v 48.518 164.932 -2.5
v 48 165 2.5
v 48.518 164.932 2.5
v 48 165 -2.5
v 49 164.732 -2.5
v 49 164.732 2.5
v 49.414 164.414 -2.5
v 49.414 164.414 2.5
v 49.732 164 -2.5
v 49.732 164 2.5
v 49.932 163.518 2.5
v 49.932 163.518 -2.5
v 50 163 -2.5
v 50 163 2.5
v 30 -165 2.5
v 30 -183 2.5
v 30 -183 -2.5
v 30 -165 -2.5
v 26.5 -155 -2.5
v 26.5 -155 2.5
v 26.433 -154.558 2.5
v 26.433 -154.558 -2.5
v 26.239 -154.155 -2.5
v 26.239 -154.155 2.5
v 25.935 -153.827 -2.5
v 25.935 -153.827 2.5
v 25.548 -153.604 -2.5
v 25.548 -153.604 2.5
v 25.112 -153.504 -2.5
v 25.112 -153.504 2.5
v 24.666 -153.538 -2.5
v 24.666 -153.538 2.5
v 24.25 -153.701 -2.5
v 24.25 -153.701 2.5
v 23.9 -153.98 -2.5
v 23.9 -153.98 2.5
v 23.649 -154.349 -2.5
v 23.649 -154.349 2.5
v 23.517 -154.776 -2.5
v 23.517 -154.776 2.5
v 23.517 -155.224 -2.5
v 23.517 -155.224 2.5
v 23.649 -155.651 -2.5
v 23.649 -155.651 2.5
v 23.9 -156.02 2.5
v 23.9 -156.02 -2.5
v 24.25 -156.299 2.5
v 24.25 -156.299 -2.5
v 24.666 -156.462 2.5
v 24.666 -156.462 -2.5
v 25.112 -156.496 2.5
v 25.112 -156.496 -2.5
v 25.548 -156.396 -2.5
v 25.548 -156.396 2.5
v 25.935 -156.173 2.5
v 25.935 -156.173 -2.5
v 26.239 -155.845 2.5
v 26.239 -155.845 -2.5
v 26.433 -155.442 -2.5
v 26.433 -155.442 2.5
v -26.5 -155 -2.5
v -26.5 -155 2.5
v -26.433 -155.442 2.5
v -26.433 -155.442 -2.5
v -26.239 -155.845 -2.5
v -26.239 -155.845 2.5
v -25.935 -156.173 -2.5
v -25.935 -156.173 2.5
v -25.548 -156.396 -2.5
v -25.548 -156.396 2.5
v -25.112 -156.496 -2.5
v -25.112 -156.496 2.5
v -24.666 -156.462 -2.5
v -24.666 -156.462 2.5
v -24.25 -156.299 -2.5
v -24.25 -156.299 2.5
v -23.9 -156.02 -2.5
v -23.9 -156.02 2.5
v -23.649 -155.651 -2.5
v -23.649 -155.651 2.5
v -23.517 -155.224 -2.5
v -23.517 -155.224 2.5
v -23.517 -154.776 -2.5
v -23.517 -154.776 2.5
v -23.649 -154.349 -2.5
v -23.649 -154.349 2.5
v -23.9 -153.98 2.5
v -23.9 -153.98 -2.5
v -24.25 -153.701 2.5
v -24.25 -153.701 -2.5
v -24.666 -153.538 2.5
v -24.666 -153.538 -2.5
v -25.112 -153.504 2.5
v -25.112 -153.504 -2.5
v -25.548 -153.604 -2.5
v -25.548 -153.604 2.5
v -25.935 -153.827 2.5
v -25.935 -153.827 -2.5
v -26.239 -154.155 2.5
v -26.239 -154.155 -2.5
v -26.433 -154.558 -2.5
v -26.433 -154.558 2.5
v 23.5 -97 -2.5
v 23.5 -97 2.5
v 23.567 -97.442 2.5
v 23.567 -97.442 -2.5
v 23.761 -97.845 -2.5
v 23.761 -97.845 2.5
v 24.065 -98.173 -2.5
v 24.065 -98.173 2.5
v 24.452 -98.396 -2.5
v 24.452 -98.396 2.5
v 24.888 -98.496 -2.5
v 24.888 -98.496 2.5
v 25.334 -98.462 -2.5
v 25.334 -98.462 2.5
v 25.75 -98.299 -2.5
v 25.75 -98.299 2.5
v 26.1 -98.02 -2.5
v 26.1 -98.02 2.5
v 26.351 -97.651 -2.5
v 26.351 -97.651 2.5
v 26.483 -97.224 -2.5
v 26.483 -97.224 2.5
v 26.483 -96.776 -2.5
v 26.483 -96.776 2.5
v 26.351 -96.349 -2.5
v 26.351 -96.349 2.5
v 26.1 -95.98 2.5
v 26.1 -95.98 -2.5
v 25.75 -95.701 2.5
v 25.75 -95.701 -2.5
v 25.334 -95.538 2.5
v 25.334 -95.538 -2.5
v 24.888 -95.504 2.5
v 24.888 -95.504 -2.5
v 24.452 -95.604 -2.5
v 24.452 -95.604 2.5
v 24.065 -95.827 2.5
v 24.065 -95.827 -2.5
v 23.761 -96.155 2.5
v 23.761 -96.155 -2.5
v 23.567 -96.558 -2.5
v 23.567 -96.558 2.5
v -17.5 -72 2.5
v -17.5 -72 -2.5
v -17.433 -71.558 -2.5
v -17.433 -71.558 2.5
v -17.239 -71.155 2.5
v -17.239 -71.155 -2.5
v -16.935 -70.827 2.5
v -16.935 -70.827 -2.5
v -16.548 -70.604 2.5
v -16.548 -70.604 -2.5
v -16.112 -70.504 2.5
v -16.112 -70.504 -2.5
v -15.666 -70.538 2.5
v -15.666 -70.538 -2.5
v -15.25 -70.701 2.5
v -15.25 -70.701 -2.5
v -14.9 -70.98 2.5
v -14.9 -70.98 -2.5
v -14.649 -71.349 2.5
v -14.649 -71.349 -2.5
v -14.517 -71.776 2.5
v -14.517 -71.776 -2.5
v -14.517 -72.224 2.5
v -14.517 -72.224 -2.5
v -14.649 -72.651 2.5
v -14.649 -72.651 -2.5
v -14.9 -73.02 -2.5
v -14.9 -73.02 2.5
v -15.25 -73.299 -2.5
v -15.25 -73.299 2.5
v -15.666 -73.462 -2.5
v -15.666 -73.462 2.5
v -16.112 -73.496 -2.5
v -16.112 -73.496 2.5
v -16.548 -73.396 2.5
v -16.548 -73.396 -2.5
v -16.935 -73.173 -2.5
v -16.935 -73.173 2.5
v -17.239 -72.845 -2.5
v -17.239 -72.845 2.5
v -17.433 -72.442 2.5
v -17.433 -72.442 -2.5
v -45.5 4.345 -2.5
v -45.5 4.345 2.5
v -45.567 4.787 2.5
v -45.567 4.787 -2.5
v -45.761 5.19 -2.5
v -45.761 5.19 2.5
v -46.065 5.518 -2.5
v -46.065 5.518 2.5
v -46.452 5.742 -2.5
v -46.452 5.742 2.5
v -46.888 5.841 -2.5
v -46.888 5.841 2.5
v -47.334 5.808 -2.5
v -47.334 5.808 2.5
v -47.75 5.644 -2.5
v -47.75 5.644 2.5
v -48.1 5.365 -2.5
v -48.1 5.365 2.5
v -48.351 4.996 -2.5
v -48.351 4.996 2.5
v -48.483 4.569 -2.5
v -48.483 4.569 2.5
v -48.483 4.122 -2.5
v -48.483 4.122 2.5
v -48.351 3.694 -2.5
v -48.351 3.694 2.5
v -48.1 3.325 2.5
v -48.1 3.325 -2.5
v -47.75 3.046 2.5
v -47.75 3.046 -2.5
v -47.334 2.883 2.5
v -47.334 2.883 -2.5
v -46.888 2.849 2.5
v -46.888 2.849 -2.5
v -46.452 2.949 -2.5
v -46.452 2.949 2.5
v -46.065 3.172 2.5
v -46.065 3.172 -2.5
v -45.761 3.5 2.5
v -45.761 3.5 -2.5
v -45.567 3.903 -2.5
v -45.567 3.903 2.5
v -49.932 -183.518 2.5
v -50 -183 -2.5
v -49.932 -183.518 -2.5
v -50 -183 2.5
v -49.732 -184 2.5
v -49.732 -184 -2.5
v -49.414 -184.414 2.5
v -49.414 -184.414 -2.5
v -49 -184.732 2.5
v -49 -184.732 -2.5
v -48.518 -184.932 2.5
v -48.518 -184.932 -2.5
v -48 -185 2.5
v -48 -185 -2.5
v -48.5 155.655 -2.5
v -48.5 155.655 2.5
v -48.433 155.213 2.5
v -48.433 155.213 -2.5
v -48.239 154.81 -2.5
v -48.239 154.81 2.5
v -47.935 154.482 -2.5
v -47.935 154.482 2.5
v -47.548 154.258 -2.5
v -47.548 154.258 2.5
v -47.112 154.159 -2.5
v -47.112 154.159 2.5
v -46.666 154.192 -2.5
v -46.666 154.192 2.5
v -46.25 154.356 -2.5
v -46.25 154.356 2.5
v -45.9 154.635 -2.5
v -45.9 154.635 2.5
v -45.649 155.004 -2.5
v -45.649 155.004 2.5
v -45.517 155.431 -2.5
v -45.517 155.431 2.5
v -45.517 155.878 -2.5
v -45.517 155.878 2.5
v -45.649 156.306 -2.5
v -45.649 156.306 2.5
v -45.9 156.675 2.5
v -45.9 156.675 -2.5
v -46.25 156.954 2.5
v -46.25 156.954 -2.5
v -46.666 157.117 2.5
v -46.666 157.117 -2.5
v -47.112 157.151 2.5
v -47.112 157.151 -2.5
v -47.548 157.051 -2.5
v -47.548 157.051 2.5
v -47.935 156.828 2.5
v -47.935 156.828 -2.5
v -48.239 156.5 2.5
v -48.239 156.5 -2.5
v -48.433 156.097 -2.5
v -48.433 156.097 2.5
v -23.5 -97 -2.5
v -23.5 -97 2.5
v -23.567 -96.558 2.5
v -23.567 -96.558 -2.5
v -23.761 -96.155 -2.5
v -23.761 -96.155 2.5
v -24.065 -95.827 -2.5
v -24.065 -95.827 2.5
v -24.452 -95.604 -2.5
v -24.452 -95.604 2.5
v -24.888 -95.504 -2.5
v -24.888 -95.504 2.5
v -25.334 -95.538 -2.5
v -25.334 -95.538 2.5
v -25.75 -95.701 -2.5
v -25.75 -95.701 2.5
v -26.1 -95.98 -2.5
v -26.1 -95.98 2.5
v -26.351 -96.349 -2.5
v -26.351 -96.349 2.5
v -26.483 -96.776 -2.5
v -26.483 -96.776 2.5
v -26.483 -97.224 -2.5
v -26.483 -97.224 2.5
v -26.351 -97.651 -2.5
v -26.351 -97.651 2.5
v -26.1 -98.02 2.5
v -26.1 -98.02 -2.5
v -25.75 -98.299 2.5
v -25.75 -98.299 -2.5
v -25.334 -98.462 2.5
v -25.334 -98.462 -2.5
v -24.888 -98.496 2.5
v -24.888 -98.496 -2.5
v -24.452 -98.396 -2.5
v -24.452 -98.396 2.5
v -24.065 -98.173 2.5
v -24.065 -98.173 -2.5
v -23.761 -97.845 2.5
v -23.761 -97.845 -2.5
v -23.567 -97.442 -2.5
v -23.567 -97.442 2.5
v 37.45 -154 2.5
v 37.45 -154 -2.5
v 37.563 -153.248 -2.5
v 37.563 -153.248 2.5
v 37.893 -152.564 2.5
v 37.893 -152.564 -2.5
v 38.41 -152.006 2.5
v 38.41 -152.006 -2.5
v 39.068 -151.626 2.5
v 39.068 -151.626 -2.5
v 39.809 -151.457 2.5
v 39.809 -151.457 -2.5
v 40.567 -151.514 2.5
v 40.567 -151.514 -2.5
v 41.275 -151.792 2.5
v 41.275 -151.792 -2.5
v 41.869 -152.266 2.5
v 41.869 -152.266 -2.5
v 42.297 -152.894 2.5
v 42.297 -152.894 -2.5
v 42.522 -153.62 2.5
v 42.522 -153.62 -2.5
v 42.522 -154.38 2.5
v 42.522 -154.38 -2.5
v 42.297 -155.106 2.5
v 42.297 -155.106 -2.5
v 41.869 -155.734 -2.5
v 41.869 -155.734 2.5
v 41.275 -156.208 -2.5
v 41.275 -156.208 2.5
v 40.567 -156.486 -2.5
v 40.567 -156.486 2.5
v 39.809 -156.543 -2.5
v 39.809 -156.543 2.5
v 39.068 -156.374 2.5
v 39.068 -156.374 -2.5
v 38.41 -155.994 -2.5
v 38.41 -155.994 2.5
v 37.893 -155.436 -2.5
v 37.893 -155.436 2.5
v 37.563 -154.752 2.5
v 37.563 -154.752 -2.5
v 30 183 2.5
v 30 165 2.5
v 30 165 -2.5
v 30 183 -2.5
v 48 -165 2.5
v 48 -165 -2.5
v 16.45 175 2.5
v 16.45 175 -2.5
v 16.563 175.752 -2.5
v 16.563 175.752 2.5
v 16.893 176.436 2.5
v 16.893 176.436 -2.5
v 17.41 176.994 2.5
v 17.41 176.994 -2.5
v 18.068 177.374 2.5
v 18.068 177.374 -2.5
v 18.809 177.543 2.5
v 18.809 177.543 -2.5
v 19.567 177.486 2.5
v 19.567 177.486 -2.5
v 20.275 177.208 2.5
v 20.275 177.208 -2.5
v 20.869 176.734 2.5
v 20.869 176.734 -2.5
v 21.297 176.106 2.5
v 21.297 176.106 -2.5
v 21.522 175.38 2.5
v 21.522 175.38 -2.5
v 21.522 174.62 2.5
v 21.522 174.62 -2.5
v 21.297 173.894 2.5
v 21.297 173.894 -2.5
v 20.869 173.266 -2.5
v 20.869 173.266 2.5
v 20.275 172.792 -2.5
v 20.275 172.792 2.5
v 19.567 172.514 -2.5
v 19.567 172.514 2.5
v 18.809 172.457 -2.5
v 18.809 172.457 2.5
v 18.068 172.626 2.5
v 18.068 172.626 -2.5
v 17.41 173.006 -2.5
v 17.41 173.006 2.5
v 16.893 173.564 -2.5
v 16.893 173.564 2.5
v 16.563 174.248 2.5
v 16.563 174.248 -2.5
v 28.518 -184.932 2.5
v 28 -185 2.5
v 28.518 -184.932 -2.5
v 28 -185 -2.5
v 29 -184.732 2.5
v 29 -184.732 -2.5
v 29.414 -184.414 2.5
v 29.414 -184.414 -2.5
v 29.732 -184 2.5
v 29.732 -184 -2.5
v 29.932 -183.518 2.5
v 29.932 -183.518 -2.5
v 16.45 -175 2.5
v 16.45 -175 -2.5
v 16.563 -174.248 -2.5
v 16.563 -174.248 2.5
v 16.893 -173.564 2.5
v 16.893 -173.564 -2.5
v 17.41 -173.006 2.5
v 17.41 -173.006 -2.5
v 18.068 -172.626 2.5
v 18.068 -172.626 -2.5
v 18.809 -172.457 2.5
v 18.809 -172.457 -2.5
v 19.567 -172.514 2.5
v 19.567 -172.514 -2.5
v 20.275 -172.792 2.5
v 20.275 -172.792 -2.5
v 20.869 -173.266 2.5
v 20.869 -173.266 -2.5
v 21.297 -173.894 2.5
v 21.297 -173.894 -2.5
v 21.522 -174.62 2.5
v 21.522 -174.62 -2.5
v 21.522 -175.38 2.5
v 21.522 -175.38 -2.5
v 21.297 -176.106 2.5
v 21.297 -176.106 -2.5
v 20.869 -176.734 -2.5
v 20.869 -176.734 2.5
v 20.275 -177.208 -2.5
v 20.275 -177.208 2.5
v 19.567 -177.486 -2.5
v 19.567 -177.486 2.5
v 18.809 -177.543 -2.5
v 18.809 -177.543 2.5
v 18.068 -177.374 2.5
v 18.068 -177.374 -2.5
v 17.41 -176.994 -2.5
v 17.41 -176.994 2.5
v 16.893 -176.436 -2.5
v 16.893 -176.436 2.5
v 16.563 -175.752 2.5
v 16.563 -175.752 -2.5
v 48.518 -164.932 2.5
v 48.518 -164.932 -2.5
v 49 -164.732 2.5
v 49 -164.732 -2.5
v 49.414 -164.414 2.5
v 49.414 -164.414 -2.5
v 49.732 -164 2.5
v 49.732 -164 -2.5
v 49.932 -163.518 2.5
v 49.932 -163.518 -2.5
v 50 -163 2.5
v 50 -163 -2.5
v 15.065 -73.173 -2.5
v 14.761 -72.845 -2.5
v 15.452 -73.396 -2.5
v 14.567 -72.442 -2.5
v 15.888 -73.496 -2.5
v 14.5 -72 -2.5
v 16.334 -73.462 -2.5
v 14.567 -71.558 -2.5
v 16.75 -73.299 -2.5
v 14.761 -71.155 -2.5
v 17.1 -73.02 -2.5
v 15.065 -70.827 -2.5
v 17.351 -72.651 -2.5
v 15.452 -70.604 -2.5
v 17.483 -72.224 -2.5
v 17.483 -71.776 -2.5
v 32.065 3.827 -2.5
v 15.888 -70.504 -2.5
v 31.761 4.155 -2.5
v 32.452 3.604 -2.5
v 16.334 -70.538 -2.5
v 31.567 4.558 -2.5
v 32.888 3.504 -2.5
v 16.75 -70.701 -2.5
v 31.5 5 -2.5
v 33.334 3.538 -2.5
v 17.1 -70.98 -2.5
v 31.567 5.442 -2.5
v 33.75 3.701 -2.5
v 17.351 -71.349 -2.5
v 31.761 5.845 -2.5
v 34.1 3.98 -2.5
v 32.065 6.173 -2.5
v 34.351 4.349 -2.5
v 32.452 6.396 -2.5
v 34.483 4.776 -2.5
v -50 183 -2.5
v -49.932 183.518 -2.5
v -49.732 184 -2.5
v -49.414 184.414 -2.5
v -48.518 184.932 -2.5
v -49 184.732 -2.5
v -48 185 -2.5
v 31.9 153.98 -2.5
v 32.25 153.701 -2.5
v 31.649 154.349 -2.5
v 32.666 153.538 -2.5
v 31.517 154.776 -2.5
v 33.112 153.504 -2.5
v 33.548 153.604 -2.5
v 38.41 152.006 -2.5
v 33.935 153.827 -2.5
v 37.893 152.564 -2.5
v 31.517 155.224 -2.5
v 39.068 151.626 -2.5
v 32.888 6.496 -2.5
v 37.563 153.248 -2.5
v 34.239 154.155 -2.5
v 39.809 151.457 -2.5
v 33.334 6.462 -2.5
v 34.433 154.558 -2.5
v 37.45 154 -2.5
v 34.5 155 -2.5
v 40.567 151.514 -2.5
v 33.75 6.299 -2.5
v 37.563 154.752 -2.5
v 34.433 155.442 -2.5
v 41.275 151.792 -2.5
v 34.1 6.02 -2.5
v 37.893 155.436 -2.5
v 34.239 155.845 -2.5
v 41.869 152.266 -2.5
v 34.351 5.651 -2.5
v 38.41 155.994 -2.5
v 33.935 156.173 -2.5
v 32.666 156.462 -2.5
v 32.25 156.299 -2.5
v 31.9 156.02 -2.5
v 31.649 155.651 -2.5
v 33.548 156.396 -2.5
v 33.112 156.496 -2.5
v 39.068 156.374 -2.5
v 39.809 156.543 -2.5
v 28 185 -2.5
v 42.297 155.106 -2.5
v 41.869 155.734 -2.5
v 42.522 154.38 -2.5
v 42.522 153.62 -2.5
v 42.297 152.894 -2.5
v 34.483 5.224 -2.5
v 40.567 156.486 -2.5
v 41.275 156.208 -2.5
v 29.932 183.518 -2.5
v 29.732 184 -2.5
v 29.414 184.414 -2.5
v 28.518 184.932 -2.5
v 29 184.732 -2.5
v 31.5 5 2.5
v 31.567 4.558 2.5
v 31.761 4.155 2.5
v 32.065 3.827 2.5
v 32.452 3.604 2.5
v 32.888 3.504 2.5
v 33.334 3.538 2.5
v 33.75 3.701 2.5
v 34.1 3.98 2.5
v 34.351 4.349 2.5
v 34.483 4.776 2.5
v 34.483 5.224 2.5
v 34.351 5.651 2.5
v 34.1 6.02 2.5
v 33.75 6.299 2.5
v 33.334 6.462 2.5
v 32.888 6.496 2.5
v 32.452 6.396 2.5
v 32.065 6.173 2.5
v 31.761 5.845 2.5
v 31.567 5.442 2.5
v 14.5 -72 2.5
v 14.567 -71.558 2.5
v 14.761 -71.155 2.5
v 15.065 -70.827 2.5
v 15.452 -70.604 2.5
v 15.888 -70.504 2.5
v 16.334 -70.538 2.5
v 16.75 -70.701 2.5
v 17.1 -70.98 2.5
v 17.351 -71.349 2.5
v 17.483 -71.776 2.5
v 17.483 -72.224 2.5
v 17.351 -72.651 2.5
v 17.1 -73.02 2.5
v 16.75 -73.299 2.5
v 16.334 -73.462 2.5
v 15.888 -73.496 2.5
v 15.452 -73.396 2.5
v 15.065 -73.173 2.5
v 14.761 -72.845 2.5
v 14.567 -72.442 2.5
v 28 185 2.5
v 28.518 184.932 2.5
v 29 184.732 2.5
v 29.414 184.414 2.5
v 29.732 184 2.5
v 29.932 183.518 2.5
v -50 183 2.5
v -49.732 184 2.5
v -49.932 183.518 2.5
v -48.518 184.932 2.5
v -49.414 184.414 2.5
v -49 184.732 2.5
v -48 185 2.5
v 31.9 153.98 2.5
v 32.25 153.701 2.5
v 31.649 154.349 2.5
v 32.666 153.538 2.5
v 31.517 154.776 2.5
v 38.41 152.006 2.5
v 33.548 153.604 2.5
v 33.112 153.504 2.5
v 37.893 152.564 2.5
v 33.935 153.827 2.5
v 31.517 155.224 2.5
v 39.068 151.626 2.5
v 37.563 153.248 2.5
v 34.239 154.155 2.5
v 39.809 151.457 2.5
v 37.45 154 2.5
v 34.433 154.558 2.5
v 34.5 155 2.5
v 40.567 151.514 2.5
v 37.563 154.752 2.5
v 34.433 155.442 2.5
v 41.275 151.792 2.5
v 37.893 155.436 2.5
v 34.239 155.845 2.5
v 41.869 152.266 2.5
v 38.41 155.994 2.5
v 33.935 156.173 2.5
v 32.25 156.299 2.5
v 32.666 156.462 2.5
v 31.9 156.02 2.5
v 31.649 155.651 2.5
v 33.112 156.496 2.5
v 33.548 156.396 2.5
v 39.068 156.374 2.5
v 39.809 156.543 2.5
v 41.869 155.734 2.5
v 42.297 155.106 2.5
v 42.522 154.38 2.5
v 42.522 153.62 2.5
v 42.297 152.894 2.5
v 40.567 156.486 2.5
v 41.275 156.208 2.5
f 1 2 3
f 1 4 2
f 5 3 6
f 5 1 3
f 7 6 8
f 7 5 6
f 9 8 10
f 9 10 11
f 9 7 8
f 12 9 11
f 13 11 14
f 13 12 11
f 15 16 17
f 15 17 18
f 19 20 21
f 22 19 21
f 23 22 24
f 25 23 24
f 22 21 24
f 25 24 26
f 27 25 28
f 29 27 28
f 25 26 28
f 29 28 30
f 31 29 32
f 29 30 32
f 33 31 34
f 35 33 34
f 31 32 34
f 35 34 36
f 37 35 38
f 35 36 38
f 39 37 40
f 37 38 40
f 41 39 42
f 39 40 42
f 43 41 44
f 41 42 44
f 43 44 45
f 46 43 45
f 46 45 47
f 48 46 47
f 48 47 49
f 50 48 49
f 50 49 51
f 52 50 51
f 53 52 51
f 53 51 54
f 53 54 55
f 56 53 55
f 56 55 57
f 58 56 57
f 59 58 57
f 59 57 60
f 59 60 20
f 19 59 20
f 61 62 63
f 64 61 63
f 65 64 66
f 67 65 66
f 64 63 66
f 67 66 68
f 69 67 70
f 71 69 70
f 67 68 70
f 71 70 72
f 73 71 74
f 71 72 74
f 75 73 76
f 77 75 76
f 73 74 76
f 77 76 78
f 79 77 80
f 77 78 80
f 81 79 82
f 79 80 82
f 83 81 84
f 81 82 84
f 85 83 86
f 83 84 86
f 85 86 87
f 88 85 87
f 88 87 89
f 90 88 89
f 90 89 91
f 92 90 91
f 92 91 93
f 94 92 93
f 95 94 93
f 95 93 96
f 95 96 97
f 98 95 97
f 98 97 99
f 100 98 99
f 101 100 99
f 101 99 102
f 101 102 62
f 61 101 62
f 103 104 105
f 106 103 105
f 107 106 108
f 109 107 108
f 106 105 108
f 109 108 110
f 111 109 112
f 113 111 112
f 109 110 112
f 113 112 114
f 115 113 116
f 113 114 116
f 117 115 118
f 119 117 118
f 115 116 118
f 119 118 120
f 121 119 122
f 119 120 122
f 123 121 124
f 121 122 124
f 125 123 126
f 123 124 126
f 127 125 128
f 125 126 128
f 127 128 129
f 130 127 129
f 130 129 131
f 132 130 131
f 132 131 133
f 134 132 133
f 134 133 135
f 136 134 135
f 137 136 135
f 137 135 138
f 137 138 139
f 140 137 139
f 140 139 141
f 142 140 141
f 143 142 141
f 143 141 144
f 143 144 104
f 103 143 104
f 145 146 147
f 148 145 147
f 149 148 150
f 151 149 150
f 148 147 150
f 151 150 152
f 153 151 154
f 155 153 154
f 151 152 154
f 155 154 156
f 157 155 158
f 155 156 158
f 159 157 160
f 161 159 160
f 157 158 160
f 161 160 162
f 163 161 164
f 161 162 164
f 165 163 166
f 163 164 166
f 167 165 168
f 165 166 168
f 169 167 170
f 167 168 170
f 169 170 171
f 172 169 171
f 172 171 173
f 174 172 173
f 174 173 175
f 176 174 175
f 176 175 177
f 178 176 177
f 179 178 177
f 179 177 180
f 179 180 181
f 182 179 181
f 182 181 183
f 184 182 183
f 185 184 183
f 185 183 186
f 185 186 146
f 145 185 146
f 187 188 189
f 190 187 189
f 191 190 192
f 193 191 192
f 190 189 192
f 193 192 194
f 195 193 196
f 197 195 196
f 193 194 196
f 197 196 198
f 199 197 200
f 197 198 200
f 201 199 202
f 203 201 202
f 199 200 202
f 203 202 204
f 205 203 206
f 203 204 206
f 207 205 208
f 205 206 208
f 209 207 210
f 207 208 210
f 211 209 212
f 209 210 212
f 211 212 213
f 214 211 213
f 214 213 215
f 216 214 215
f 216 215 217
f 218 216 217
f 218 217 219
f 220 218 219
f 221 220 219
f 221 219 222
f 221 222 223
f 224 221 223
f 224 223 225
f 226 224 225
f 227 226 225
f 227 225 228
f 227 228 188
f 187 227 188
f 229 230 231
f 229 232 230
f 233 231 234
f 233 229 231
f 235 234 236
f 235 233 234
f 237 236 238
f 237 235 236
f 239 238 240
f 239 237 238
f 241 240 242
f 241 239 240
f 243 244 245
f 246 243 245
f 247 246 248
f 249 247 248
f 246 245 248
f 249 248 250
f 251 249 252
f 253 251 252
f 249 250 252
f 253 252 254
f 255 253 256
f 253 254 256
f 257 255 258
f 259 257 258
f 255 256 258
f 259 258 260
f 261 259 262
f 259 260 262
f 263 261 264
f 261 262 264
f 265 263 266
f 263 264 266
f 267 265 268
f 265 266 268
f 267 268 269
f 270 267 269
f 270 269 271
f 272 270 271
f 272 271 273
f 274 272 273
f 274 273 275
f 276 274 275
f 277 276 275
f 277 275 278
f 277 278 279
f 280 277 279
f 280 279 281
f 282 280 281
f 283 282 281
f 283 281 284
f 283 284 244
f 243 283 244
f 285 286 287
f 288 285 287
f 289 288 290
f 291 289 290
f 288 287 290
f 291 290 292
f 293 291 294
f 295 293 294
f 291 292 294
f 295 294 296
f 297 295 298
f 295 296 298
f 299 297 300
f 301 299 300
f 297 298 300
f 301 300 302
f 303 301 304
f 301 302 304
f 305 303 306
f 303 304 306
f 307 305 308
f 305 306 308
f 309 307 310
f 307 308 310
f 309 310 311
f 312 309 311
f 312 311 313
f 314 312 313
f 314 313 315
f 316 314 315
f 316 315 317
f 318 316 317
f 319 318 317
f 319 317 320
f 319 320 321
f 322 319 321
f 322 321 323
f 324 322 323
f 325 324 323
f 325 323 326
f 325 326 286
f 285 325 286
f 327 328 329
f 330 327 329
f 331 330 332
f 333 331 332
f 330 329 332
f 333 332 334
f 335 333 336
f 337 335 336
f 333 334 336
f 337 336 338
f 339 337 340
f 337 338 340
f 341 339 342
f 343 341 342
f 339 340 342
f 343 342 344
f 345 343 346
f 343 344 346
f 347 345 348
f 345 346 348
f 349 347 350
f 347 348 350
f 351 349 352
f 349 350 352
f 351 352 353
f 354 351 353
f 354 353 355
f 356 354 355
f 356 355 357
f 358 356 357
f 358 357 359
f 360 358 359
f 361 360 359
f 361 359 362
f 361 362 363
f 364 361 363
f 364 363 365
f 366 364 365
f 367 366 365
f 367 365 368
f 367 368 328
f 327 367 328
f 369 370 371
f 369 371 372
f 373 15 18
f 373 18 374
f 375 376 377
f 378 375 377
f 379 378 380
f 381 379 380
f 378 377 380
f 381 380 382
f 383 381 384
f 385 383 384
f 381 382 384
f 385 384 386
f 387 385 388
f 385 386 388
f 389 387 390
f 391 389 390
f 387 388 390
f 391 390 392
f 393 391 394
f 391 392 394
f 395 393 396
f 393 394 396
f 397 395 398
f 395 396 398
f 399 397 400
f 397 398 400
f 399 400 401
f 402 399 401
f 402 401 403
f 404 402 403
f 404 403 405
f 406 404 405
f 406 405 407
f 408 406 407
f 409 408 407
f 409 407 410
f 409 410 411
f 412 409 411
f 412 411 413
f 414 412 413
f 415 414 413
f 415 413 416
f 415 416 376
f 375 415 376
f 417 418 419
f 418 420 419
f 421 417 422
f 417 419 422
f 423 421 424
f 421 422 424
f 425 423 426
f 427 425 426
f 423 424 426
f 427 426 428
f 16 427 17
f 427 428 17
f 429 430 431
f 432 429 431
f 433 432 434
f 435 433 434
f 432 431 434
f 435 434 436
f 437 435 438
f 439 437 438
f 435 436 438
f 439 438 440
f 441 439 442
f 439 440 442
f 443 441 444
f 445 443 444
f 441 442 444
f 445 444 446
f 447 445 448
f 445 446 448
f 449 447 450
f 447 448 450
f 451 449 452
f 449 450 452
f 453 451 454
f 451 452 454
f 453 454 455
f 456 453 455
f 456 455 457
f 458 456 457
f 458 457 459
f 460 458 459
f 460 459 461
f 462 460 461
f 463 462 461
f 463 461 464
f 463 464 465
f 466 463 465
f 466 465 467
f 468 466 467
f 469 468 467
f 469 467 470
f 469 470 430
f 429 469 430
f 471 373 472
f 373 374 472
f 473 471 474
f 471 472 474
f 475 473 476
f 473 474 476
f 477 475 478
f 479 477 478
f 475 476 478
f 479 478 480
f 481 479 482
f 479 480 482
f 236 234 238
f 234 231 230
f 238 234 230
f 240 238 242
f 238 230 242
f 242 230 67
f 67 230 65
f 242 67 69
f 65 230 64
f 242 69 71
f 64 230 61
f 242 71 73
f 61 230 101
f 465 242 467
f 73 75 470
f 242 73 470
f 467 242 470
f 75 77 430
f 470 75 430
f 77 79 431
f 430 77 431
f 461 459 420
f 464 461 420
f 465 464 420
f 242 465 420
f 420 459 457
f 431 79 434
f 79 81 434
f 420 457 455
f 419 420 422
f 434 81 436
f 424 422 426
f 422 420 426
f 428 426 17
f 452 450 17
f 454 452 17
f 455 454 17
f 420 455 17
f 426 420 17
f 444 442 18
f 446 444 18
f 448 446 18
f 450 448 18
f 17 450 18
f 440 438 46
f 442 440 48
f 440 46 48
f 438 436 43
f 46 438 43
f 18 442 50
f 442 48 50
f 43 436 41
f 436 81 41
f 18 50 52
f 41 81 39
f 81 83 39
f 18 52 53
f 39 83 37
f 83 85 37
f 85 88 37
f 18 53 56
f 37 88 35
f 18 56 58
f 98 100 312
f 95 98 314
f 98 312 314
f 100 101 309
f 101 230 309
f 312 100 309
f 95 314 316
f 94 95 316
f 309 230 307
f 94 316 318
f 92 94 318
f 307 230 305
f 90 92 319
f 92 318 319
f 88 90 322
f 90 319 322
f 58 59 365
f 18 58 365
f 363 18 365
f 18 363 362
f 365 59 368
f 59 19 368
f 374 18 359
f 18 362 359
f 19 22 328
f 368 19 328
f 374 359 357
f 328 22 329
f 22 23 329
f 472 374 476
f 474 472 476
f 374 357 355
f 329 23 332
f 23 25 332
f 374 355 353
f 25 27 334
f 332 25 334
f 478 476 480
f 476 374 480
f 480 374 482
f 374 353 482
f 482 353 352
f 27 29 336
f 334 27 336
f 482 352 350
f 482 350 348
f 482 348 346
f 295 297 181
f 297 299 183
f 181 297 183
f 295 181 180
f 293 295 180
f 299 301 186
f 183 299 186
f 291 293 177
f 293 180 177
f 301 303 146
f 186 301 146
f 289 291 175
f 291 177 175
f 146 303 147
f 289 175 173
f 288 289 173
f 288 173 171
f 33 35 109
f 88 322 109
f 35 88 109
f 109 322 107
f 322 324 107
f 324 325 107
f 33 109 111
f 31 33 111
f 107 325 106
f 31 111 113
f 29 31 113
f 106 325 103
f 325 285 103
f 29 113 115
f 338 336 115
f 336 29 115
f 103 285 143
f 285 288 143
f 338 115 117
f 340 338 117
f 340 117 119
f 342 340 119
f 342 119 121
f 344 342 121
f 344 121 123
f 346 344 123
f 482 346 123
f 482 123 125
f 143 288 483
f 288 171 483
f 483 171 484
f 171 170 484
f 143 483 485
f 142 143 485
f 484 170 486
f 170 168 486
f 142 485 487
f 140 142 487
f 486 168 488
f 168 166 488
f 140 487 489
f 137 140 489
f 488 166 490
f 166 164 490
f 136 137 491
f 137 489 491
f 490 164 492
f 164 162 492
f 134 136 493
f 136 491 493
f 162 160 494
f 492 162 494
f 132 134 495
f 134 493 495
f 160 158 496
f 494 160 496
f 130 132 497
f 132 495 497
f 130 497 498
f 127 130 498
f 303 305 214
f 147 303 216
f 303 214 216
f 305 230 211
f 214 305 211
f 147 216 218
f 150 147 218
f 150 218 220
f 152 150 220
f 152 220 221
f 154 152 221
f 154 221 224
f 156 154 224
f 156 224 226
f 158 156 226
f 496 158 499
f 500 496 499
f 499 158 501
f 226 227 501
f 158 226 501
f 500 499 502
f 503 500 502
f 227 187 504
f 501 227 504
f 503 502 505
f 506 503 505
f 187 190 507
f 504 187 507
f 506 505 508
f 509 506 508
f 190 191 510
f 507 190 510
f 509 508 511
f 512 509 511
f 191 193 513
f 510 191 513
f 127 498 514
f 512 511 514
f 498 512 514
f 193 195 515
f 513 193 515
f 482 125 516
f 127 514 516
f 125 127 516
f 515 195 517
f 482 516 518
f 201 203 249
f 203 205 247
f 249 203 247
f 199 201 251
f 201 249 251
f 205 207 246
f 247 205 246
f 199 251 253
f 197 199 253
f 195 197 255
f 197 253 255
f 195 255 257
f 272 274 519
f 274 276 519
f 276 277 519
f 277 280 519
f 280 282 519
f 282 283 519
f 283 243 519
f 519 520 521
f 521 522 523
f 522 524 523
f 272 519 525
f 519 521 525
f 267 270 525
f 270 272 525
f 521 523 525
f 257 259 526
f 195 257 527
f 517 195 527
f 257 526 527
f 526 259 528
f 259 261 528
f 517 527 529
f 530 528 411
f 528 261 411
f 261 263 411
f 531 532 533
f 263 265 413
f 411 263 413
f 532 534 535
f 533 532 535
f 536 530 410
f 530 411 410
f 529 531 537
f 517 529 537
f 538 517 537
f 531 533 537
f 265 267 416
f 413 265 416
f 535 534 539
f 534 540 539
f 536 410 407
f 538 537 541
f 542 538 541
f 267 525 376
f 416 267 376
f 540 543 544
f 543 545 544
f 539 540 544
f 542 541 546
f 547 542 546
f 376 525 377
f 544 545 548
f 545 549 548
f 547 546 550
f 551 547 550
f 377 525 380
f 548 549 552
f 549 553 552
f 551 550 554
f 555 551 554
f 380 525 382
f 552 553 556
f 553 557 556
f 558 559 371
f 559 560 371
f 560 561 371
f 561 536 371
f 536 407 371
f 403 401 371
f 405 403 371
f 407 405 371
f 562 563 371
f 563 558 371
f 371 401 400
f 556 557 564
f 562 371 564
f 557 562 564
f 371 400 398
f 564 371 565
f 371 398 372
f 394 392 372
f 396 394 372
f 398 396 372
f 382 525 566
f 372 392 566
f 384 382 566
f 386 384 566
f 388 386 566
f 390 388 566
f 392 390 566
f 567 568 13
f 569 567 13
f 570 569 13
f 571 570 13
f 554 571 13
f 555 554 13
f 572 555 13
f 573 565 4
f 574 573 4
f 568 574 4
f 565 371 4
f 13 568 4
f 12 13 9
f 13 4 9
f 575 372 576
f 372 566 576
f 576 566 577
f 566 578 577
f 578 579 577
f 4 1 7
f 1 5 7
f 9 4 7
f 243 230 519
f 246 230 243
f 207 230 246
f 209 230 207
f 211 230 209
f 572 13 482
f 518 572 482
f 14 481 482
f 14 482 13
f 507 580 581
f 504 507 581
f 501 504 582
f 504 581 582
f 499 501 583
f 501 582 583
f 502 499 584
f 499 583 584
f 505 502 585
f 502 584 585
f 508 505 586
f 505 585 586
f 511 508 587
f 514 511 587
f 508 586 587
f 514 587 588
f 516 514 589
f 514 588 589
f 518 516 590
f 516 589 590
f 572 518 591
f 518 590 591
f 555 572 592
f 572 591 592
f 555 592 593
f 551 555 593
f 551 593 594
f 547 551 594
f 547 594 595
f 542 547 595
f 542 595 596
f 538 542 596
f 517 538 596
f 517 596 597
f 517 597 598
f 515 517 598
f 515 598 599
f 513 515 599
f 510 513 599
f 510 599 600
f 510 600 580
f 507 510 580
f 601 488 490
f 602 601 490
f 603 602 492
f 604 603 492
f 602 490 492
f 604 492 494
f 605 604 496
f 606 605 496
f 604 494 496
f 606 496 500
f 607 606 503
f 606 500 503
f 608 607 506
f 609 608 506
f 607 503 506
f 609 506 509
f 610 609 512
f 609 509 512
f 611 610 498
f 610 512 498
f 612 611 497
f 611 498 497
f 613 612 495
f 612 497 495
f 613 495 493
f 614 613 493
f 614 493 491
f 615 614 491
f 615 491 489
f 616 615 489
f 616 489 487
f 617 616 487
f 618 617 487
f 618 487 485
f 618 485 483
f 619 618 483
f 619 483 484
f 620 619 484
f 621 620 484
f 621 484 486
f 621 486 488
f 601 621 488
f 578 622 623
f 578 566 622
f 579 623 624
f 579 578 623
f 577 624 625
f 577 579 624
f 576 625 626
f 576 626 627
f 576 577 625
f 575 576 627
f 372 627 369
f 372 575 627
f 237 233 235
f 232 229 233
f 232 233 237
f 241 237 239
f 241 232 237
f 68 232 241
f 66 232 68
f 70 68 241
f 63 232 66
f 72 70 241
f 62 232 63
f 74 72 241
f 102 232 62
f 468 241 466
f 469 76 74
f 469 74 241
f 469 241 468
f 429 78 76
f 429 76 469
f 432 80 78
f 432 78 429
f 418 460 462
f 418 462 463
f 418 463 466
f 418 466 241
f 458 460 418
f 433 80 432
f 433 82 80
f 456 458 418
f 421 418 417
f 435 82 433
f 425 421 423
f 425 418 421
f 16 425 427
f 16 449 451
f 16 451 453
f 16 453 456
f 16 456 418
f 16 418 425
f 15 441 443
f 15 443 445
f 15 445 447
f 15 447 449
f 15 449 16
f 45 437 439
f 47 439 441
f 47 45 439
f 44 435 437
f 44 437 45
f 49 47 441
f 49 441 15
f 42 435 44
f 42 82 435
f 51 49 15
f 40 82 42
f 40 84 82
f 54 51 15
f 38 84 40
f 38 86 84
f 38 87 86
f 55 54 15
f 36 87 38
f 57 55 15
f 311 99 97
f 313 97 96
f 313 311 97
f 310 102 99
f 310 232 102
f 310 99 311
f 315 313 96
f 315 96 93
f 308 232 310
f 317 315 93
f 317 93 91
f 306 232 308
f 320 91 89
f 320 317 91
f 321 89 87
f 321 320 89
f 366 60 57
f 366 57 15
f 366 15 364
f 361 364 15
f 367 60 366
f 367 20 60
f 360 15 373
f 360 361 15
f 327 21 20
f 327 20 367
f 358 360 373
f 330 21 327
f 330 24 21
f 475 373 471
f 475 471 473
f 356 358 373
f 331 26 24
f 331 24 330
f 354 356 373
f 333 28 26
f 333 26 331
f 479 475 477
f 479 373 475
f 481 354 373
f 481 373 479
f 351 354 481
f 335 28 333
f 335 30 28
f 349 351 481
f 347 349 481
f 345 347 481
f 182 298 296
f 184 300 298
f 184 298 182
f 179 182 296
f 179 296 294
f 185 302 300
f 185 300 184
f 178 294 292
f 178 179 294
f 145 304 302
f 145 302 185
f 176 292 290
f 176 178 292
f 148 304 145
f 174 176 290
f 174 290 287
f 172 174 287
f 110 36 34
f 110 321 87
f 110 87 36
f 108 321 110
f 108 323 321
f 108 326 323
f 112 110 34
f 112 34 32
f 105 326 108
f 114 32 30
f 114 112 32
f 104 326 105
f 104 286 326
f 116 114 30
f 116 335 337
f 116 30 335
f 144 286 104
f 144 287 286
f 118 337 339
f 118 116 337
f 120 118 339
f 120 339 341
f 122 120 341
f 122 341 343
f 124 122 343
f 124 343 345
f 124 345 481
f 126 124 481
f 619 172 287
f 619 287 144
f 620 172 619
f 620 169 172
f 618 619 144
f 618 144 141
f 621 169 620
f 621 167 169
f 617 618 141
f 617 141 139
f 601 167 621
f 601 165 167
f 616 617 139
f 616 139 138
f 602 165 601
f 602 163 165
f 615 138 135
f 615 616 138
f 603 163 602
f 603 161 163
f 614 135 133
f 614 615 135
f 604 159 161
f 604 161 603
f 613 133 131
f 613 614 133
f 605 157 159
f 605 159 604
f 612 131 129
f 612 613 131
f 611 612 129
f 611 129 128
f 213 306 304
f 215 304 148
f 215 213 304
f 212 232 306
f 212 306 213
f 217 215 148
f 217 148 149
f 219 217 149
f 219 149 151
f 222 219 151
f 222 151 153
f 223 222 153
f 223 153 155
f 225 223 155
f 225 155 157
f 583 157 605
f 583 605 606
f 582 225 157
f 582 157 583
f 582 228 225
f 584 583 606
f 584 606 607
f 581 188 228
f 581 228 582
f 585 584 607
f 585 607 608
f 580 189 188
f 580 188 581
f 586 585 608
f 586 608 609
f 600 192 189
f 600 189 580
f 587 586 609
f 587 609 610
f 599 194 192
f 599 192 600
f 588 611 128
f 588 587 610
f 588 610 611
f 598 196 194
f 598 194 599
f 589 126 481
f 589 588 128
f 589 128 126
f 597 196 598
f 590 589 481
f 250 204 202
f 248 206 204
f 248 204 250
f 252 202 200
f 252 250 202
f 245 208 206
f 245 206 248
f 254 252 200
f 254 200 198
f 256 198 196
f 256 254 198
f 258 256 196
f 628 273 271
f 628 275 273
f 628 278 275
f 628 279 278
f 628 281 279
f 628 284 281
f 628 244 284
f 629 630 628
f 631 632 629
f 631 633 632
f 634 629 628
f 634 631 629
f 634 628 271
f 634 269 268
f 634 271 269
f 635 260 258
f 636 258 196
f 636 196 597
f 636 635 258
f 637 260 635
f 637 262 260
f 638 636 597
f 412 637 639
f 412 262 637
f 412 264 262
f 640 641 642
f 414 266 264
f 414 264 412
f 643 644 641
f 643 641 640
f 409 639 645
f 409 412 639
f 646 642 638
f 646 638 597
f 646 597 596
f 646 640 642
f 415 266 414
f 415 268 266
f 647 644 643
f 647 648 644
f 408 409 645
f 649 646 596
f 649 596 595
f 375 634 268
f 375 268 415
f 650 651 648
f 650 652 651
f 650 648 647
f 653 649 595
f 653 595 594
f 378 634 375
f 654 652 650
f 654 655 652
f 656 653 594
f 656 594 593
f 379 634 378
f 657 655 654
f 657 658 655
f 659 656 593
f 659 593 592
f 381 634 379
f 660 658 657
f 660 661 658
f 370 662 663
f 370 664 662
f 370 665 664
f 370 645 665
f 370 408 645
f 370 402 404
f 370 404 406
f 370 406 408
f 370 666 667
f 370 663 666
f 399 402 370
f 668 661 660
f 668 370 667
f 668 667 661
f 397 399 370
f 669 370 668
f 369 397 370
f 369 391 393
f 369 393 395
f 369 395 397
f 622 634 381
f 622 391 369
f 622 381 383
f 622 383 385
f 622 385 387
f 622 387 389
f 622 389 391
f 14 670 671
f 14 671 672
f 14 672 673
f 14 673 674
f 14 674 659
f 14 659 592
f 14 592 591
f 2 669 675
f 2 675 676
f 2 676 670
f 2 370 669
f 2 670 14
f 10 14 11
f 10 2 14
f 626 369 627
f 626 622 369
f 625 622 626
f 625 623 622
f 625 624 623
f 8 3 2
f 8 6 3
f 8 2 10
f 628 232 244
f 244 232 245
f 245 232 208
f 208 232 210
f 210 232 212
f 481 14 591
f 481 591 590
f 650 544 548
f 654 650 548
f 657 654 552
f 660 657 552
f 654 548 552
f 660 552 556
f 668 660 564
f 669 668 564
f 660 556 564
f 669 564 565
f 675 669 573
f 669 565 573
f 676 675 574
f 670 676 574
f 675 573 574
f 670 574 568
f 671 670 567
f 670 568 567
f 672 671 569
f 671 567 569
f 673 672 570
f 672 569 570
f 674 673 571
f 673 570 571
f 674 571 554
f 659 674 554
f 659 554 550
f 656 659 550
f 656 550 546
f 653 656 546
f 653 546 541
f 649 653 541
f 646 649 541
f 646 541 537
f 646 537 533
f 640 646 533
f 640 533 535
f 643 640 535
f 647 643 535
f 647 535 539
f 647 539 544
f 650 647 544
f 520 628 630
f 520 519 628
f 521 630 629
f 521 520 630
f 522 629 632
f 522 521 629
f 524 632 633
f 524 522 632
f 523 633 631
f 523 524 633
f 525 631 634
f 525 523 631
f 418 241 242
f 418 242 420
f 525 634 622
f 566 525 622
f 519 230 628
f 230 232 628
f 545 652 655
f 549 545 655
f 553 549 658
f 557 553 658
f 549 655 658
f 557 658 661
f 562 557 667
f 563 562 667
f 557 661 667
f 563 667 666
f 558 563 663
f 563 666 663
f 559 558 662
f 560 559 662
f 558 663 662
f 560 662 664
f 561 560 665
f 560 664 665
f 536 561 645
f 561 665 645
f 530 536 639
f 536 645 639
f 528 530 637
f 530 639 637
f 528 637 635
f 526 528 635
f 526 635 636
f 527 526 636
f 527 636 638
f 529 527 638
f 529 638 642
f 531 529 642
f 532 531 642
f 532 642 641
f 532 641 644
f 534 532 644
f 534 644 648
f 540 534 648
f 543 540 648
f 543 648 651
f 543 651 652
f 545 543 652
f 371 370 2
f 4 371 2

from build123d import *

# Parameters (mm, degrees)
SKETCH_2_W          = 100
SKETCH_2_H          = 370
EXTRUDE_1_DEPTH     = 2.5
SKETCH_5_R          = 1.5
CUT_EXTRUDE_3_DEPTH = 192.702895127
SKETCH_6_R          = 1.5
CUT_EXTRUDE_4_DEPTH = 192.702895127
SKETCH_7_W          = 20
SKETCH_7_H          = 20
CUT_EXTRUDE_5_DEPTH = 192.702895127
SKETCH_8_R          = 2.55
CUT_EXTRUDE_6_DEPTH = 192.702895127
FILLET_1_R          = 2
SKETCH_10_R         = 1.5
CUT_EXTRUDE_7_DEPTH = 13


with BuildPart() as part:
    # 草图2 → 凸台-拉伸1 (new, symmetric)
    with BuildSketch(Plane.XY):
        Rectangle(SKETCH_2_W, SKETCH_2_H)
    extrude(amount=EXTRUDE_1_DEPTH, both=True)

    # 草图5 → 切除-拉伸3 (cut, through all)
    with BuildSketch(Plane.XY.offset(2.5)):
        with Locations((33, 155)):
            Circle(SKETCH_5_R)
        with Locations(Location((-47, 155.654762379, 0), (0, 0, 180))):
            Circle(SKETCH_5_R)
        with Locations(Location((33, 5, 0), (0, 0, 180))):
            Circle(SKETCH_5_R)
        with Locations((-47, 4.345237621)):
            Circle(SKETCH_5_R)
    extrude(amount=-CUT_EXTRUDE_3_DEPTH, mode=Mode.SUBTRACT)

    # 草图6 → 切除-拉伸4 (cut, through all)
    with BuildSketch(Plane.XY.offset(2.5)):
        with Locations((25, -155)):
            Circle(SKETCH_6_R)
        with Locations(Location((-25, -155, 0), (0, 0, 180))):
            Circle(SKETCH_6_R)
        with Locations(Location((25, -97, 0), (0, 0, 180))):
            Circle(SKETCH_6_R)
        with Locations((-25, -97)):
            Circle(SKETCH_6_R)
    extrude(amount=-CUT_EXTRUDE_4_DEPTH, mode=Mode.SUBTRACT)

    # 草图7 → 切除-拉伸5 (cut, through all)
    with BuildSketch(Plane.XY.offset(2.5)):
        with Locations((40, 175)):
            Rectangle(SKETCH_7_W, SKETCH_7_H)
        with Locations((40, -175)):
            Rectangle(SKETCH_7_W, SKETCH_7_H)
    extrude(amount=-CUT_EXTRUDE_5_DEPTH, mode=Mode.SUBTRACT)

    # 草图8 → 切除-拉伸6 (cut, through all)
    with BuildSketch(Plane(origin=(0, 0, -2.5), x_dir=(-1, 0, 0), z_dir=(0, 0, -1))):
        with Locations((-19, 175)):
            Circle(SKETCH_8_R)
        with Locations((-40, 154)):
            Circle(SKETCH_8_R)
        with Locations((-40, -154)):
            Circle(SKETCH_8_R)
        with Locations((-19, -175)):
            Circle(SKETCH_8_R)
    extrude(amount=-CUT_EXTRUDE_6_DEPTH, mode=Mode.SUBTRACT)

    # 圆角1
    fillet_1_edges = [part.edges().sort_by_distance(p)[0] for p in [
        (50, 165, 0),
        (30, 185, 0),
        (30, -185, 0),
        (50, -165, 0),
        (-50, 185, 0),
        (-50, -185, 0),
    ]]
    fillet(fillet_1_edges, radius=FILLET_1_R)

    # 草图10 → 切除-拉伸7 (cut)
    with BuildSketch(Plane(origin=(0, 0, -2.5), x_dir=(-1, 0, 0), z_dir=(0, 0, -1))):
        with Locations((-16, -72)):
            Circle(SKETCH_10_R)
        with Locations((16, -72)):
            Circle(SKETCH_10_R)
    extrude(amount=-CUT_EXTRUDE_7_DEPTH, mode=Mode.SUBTRACT)


solid = part.part
